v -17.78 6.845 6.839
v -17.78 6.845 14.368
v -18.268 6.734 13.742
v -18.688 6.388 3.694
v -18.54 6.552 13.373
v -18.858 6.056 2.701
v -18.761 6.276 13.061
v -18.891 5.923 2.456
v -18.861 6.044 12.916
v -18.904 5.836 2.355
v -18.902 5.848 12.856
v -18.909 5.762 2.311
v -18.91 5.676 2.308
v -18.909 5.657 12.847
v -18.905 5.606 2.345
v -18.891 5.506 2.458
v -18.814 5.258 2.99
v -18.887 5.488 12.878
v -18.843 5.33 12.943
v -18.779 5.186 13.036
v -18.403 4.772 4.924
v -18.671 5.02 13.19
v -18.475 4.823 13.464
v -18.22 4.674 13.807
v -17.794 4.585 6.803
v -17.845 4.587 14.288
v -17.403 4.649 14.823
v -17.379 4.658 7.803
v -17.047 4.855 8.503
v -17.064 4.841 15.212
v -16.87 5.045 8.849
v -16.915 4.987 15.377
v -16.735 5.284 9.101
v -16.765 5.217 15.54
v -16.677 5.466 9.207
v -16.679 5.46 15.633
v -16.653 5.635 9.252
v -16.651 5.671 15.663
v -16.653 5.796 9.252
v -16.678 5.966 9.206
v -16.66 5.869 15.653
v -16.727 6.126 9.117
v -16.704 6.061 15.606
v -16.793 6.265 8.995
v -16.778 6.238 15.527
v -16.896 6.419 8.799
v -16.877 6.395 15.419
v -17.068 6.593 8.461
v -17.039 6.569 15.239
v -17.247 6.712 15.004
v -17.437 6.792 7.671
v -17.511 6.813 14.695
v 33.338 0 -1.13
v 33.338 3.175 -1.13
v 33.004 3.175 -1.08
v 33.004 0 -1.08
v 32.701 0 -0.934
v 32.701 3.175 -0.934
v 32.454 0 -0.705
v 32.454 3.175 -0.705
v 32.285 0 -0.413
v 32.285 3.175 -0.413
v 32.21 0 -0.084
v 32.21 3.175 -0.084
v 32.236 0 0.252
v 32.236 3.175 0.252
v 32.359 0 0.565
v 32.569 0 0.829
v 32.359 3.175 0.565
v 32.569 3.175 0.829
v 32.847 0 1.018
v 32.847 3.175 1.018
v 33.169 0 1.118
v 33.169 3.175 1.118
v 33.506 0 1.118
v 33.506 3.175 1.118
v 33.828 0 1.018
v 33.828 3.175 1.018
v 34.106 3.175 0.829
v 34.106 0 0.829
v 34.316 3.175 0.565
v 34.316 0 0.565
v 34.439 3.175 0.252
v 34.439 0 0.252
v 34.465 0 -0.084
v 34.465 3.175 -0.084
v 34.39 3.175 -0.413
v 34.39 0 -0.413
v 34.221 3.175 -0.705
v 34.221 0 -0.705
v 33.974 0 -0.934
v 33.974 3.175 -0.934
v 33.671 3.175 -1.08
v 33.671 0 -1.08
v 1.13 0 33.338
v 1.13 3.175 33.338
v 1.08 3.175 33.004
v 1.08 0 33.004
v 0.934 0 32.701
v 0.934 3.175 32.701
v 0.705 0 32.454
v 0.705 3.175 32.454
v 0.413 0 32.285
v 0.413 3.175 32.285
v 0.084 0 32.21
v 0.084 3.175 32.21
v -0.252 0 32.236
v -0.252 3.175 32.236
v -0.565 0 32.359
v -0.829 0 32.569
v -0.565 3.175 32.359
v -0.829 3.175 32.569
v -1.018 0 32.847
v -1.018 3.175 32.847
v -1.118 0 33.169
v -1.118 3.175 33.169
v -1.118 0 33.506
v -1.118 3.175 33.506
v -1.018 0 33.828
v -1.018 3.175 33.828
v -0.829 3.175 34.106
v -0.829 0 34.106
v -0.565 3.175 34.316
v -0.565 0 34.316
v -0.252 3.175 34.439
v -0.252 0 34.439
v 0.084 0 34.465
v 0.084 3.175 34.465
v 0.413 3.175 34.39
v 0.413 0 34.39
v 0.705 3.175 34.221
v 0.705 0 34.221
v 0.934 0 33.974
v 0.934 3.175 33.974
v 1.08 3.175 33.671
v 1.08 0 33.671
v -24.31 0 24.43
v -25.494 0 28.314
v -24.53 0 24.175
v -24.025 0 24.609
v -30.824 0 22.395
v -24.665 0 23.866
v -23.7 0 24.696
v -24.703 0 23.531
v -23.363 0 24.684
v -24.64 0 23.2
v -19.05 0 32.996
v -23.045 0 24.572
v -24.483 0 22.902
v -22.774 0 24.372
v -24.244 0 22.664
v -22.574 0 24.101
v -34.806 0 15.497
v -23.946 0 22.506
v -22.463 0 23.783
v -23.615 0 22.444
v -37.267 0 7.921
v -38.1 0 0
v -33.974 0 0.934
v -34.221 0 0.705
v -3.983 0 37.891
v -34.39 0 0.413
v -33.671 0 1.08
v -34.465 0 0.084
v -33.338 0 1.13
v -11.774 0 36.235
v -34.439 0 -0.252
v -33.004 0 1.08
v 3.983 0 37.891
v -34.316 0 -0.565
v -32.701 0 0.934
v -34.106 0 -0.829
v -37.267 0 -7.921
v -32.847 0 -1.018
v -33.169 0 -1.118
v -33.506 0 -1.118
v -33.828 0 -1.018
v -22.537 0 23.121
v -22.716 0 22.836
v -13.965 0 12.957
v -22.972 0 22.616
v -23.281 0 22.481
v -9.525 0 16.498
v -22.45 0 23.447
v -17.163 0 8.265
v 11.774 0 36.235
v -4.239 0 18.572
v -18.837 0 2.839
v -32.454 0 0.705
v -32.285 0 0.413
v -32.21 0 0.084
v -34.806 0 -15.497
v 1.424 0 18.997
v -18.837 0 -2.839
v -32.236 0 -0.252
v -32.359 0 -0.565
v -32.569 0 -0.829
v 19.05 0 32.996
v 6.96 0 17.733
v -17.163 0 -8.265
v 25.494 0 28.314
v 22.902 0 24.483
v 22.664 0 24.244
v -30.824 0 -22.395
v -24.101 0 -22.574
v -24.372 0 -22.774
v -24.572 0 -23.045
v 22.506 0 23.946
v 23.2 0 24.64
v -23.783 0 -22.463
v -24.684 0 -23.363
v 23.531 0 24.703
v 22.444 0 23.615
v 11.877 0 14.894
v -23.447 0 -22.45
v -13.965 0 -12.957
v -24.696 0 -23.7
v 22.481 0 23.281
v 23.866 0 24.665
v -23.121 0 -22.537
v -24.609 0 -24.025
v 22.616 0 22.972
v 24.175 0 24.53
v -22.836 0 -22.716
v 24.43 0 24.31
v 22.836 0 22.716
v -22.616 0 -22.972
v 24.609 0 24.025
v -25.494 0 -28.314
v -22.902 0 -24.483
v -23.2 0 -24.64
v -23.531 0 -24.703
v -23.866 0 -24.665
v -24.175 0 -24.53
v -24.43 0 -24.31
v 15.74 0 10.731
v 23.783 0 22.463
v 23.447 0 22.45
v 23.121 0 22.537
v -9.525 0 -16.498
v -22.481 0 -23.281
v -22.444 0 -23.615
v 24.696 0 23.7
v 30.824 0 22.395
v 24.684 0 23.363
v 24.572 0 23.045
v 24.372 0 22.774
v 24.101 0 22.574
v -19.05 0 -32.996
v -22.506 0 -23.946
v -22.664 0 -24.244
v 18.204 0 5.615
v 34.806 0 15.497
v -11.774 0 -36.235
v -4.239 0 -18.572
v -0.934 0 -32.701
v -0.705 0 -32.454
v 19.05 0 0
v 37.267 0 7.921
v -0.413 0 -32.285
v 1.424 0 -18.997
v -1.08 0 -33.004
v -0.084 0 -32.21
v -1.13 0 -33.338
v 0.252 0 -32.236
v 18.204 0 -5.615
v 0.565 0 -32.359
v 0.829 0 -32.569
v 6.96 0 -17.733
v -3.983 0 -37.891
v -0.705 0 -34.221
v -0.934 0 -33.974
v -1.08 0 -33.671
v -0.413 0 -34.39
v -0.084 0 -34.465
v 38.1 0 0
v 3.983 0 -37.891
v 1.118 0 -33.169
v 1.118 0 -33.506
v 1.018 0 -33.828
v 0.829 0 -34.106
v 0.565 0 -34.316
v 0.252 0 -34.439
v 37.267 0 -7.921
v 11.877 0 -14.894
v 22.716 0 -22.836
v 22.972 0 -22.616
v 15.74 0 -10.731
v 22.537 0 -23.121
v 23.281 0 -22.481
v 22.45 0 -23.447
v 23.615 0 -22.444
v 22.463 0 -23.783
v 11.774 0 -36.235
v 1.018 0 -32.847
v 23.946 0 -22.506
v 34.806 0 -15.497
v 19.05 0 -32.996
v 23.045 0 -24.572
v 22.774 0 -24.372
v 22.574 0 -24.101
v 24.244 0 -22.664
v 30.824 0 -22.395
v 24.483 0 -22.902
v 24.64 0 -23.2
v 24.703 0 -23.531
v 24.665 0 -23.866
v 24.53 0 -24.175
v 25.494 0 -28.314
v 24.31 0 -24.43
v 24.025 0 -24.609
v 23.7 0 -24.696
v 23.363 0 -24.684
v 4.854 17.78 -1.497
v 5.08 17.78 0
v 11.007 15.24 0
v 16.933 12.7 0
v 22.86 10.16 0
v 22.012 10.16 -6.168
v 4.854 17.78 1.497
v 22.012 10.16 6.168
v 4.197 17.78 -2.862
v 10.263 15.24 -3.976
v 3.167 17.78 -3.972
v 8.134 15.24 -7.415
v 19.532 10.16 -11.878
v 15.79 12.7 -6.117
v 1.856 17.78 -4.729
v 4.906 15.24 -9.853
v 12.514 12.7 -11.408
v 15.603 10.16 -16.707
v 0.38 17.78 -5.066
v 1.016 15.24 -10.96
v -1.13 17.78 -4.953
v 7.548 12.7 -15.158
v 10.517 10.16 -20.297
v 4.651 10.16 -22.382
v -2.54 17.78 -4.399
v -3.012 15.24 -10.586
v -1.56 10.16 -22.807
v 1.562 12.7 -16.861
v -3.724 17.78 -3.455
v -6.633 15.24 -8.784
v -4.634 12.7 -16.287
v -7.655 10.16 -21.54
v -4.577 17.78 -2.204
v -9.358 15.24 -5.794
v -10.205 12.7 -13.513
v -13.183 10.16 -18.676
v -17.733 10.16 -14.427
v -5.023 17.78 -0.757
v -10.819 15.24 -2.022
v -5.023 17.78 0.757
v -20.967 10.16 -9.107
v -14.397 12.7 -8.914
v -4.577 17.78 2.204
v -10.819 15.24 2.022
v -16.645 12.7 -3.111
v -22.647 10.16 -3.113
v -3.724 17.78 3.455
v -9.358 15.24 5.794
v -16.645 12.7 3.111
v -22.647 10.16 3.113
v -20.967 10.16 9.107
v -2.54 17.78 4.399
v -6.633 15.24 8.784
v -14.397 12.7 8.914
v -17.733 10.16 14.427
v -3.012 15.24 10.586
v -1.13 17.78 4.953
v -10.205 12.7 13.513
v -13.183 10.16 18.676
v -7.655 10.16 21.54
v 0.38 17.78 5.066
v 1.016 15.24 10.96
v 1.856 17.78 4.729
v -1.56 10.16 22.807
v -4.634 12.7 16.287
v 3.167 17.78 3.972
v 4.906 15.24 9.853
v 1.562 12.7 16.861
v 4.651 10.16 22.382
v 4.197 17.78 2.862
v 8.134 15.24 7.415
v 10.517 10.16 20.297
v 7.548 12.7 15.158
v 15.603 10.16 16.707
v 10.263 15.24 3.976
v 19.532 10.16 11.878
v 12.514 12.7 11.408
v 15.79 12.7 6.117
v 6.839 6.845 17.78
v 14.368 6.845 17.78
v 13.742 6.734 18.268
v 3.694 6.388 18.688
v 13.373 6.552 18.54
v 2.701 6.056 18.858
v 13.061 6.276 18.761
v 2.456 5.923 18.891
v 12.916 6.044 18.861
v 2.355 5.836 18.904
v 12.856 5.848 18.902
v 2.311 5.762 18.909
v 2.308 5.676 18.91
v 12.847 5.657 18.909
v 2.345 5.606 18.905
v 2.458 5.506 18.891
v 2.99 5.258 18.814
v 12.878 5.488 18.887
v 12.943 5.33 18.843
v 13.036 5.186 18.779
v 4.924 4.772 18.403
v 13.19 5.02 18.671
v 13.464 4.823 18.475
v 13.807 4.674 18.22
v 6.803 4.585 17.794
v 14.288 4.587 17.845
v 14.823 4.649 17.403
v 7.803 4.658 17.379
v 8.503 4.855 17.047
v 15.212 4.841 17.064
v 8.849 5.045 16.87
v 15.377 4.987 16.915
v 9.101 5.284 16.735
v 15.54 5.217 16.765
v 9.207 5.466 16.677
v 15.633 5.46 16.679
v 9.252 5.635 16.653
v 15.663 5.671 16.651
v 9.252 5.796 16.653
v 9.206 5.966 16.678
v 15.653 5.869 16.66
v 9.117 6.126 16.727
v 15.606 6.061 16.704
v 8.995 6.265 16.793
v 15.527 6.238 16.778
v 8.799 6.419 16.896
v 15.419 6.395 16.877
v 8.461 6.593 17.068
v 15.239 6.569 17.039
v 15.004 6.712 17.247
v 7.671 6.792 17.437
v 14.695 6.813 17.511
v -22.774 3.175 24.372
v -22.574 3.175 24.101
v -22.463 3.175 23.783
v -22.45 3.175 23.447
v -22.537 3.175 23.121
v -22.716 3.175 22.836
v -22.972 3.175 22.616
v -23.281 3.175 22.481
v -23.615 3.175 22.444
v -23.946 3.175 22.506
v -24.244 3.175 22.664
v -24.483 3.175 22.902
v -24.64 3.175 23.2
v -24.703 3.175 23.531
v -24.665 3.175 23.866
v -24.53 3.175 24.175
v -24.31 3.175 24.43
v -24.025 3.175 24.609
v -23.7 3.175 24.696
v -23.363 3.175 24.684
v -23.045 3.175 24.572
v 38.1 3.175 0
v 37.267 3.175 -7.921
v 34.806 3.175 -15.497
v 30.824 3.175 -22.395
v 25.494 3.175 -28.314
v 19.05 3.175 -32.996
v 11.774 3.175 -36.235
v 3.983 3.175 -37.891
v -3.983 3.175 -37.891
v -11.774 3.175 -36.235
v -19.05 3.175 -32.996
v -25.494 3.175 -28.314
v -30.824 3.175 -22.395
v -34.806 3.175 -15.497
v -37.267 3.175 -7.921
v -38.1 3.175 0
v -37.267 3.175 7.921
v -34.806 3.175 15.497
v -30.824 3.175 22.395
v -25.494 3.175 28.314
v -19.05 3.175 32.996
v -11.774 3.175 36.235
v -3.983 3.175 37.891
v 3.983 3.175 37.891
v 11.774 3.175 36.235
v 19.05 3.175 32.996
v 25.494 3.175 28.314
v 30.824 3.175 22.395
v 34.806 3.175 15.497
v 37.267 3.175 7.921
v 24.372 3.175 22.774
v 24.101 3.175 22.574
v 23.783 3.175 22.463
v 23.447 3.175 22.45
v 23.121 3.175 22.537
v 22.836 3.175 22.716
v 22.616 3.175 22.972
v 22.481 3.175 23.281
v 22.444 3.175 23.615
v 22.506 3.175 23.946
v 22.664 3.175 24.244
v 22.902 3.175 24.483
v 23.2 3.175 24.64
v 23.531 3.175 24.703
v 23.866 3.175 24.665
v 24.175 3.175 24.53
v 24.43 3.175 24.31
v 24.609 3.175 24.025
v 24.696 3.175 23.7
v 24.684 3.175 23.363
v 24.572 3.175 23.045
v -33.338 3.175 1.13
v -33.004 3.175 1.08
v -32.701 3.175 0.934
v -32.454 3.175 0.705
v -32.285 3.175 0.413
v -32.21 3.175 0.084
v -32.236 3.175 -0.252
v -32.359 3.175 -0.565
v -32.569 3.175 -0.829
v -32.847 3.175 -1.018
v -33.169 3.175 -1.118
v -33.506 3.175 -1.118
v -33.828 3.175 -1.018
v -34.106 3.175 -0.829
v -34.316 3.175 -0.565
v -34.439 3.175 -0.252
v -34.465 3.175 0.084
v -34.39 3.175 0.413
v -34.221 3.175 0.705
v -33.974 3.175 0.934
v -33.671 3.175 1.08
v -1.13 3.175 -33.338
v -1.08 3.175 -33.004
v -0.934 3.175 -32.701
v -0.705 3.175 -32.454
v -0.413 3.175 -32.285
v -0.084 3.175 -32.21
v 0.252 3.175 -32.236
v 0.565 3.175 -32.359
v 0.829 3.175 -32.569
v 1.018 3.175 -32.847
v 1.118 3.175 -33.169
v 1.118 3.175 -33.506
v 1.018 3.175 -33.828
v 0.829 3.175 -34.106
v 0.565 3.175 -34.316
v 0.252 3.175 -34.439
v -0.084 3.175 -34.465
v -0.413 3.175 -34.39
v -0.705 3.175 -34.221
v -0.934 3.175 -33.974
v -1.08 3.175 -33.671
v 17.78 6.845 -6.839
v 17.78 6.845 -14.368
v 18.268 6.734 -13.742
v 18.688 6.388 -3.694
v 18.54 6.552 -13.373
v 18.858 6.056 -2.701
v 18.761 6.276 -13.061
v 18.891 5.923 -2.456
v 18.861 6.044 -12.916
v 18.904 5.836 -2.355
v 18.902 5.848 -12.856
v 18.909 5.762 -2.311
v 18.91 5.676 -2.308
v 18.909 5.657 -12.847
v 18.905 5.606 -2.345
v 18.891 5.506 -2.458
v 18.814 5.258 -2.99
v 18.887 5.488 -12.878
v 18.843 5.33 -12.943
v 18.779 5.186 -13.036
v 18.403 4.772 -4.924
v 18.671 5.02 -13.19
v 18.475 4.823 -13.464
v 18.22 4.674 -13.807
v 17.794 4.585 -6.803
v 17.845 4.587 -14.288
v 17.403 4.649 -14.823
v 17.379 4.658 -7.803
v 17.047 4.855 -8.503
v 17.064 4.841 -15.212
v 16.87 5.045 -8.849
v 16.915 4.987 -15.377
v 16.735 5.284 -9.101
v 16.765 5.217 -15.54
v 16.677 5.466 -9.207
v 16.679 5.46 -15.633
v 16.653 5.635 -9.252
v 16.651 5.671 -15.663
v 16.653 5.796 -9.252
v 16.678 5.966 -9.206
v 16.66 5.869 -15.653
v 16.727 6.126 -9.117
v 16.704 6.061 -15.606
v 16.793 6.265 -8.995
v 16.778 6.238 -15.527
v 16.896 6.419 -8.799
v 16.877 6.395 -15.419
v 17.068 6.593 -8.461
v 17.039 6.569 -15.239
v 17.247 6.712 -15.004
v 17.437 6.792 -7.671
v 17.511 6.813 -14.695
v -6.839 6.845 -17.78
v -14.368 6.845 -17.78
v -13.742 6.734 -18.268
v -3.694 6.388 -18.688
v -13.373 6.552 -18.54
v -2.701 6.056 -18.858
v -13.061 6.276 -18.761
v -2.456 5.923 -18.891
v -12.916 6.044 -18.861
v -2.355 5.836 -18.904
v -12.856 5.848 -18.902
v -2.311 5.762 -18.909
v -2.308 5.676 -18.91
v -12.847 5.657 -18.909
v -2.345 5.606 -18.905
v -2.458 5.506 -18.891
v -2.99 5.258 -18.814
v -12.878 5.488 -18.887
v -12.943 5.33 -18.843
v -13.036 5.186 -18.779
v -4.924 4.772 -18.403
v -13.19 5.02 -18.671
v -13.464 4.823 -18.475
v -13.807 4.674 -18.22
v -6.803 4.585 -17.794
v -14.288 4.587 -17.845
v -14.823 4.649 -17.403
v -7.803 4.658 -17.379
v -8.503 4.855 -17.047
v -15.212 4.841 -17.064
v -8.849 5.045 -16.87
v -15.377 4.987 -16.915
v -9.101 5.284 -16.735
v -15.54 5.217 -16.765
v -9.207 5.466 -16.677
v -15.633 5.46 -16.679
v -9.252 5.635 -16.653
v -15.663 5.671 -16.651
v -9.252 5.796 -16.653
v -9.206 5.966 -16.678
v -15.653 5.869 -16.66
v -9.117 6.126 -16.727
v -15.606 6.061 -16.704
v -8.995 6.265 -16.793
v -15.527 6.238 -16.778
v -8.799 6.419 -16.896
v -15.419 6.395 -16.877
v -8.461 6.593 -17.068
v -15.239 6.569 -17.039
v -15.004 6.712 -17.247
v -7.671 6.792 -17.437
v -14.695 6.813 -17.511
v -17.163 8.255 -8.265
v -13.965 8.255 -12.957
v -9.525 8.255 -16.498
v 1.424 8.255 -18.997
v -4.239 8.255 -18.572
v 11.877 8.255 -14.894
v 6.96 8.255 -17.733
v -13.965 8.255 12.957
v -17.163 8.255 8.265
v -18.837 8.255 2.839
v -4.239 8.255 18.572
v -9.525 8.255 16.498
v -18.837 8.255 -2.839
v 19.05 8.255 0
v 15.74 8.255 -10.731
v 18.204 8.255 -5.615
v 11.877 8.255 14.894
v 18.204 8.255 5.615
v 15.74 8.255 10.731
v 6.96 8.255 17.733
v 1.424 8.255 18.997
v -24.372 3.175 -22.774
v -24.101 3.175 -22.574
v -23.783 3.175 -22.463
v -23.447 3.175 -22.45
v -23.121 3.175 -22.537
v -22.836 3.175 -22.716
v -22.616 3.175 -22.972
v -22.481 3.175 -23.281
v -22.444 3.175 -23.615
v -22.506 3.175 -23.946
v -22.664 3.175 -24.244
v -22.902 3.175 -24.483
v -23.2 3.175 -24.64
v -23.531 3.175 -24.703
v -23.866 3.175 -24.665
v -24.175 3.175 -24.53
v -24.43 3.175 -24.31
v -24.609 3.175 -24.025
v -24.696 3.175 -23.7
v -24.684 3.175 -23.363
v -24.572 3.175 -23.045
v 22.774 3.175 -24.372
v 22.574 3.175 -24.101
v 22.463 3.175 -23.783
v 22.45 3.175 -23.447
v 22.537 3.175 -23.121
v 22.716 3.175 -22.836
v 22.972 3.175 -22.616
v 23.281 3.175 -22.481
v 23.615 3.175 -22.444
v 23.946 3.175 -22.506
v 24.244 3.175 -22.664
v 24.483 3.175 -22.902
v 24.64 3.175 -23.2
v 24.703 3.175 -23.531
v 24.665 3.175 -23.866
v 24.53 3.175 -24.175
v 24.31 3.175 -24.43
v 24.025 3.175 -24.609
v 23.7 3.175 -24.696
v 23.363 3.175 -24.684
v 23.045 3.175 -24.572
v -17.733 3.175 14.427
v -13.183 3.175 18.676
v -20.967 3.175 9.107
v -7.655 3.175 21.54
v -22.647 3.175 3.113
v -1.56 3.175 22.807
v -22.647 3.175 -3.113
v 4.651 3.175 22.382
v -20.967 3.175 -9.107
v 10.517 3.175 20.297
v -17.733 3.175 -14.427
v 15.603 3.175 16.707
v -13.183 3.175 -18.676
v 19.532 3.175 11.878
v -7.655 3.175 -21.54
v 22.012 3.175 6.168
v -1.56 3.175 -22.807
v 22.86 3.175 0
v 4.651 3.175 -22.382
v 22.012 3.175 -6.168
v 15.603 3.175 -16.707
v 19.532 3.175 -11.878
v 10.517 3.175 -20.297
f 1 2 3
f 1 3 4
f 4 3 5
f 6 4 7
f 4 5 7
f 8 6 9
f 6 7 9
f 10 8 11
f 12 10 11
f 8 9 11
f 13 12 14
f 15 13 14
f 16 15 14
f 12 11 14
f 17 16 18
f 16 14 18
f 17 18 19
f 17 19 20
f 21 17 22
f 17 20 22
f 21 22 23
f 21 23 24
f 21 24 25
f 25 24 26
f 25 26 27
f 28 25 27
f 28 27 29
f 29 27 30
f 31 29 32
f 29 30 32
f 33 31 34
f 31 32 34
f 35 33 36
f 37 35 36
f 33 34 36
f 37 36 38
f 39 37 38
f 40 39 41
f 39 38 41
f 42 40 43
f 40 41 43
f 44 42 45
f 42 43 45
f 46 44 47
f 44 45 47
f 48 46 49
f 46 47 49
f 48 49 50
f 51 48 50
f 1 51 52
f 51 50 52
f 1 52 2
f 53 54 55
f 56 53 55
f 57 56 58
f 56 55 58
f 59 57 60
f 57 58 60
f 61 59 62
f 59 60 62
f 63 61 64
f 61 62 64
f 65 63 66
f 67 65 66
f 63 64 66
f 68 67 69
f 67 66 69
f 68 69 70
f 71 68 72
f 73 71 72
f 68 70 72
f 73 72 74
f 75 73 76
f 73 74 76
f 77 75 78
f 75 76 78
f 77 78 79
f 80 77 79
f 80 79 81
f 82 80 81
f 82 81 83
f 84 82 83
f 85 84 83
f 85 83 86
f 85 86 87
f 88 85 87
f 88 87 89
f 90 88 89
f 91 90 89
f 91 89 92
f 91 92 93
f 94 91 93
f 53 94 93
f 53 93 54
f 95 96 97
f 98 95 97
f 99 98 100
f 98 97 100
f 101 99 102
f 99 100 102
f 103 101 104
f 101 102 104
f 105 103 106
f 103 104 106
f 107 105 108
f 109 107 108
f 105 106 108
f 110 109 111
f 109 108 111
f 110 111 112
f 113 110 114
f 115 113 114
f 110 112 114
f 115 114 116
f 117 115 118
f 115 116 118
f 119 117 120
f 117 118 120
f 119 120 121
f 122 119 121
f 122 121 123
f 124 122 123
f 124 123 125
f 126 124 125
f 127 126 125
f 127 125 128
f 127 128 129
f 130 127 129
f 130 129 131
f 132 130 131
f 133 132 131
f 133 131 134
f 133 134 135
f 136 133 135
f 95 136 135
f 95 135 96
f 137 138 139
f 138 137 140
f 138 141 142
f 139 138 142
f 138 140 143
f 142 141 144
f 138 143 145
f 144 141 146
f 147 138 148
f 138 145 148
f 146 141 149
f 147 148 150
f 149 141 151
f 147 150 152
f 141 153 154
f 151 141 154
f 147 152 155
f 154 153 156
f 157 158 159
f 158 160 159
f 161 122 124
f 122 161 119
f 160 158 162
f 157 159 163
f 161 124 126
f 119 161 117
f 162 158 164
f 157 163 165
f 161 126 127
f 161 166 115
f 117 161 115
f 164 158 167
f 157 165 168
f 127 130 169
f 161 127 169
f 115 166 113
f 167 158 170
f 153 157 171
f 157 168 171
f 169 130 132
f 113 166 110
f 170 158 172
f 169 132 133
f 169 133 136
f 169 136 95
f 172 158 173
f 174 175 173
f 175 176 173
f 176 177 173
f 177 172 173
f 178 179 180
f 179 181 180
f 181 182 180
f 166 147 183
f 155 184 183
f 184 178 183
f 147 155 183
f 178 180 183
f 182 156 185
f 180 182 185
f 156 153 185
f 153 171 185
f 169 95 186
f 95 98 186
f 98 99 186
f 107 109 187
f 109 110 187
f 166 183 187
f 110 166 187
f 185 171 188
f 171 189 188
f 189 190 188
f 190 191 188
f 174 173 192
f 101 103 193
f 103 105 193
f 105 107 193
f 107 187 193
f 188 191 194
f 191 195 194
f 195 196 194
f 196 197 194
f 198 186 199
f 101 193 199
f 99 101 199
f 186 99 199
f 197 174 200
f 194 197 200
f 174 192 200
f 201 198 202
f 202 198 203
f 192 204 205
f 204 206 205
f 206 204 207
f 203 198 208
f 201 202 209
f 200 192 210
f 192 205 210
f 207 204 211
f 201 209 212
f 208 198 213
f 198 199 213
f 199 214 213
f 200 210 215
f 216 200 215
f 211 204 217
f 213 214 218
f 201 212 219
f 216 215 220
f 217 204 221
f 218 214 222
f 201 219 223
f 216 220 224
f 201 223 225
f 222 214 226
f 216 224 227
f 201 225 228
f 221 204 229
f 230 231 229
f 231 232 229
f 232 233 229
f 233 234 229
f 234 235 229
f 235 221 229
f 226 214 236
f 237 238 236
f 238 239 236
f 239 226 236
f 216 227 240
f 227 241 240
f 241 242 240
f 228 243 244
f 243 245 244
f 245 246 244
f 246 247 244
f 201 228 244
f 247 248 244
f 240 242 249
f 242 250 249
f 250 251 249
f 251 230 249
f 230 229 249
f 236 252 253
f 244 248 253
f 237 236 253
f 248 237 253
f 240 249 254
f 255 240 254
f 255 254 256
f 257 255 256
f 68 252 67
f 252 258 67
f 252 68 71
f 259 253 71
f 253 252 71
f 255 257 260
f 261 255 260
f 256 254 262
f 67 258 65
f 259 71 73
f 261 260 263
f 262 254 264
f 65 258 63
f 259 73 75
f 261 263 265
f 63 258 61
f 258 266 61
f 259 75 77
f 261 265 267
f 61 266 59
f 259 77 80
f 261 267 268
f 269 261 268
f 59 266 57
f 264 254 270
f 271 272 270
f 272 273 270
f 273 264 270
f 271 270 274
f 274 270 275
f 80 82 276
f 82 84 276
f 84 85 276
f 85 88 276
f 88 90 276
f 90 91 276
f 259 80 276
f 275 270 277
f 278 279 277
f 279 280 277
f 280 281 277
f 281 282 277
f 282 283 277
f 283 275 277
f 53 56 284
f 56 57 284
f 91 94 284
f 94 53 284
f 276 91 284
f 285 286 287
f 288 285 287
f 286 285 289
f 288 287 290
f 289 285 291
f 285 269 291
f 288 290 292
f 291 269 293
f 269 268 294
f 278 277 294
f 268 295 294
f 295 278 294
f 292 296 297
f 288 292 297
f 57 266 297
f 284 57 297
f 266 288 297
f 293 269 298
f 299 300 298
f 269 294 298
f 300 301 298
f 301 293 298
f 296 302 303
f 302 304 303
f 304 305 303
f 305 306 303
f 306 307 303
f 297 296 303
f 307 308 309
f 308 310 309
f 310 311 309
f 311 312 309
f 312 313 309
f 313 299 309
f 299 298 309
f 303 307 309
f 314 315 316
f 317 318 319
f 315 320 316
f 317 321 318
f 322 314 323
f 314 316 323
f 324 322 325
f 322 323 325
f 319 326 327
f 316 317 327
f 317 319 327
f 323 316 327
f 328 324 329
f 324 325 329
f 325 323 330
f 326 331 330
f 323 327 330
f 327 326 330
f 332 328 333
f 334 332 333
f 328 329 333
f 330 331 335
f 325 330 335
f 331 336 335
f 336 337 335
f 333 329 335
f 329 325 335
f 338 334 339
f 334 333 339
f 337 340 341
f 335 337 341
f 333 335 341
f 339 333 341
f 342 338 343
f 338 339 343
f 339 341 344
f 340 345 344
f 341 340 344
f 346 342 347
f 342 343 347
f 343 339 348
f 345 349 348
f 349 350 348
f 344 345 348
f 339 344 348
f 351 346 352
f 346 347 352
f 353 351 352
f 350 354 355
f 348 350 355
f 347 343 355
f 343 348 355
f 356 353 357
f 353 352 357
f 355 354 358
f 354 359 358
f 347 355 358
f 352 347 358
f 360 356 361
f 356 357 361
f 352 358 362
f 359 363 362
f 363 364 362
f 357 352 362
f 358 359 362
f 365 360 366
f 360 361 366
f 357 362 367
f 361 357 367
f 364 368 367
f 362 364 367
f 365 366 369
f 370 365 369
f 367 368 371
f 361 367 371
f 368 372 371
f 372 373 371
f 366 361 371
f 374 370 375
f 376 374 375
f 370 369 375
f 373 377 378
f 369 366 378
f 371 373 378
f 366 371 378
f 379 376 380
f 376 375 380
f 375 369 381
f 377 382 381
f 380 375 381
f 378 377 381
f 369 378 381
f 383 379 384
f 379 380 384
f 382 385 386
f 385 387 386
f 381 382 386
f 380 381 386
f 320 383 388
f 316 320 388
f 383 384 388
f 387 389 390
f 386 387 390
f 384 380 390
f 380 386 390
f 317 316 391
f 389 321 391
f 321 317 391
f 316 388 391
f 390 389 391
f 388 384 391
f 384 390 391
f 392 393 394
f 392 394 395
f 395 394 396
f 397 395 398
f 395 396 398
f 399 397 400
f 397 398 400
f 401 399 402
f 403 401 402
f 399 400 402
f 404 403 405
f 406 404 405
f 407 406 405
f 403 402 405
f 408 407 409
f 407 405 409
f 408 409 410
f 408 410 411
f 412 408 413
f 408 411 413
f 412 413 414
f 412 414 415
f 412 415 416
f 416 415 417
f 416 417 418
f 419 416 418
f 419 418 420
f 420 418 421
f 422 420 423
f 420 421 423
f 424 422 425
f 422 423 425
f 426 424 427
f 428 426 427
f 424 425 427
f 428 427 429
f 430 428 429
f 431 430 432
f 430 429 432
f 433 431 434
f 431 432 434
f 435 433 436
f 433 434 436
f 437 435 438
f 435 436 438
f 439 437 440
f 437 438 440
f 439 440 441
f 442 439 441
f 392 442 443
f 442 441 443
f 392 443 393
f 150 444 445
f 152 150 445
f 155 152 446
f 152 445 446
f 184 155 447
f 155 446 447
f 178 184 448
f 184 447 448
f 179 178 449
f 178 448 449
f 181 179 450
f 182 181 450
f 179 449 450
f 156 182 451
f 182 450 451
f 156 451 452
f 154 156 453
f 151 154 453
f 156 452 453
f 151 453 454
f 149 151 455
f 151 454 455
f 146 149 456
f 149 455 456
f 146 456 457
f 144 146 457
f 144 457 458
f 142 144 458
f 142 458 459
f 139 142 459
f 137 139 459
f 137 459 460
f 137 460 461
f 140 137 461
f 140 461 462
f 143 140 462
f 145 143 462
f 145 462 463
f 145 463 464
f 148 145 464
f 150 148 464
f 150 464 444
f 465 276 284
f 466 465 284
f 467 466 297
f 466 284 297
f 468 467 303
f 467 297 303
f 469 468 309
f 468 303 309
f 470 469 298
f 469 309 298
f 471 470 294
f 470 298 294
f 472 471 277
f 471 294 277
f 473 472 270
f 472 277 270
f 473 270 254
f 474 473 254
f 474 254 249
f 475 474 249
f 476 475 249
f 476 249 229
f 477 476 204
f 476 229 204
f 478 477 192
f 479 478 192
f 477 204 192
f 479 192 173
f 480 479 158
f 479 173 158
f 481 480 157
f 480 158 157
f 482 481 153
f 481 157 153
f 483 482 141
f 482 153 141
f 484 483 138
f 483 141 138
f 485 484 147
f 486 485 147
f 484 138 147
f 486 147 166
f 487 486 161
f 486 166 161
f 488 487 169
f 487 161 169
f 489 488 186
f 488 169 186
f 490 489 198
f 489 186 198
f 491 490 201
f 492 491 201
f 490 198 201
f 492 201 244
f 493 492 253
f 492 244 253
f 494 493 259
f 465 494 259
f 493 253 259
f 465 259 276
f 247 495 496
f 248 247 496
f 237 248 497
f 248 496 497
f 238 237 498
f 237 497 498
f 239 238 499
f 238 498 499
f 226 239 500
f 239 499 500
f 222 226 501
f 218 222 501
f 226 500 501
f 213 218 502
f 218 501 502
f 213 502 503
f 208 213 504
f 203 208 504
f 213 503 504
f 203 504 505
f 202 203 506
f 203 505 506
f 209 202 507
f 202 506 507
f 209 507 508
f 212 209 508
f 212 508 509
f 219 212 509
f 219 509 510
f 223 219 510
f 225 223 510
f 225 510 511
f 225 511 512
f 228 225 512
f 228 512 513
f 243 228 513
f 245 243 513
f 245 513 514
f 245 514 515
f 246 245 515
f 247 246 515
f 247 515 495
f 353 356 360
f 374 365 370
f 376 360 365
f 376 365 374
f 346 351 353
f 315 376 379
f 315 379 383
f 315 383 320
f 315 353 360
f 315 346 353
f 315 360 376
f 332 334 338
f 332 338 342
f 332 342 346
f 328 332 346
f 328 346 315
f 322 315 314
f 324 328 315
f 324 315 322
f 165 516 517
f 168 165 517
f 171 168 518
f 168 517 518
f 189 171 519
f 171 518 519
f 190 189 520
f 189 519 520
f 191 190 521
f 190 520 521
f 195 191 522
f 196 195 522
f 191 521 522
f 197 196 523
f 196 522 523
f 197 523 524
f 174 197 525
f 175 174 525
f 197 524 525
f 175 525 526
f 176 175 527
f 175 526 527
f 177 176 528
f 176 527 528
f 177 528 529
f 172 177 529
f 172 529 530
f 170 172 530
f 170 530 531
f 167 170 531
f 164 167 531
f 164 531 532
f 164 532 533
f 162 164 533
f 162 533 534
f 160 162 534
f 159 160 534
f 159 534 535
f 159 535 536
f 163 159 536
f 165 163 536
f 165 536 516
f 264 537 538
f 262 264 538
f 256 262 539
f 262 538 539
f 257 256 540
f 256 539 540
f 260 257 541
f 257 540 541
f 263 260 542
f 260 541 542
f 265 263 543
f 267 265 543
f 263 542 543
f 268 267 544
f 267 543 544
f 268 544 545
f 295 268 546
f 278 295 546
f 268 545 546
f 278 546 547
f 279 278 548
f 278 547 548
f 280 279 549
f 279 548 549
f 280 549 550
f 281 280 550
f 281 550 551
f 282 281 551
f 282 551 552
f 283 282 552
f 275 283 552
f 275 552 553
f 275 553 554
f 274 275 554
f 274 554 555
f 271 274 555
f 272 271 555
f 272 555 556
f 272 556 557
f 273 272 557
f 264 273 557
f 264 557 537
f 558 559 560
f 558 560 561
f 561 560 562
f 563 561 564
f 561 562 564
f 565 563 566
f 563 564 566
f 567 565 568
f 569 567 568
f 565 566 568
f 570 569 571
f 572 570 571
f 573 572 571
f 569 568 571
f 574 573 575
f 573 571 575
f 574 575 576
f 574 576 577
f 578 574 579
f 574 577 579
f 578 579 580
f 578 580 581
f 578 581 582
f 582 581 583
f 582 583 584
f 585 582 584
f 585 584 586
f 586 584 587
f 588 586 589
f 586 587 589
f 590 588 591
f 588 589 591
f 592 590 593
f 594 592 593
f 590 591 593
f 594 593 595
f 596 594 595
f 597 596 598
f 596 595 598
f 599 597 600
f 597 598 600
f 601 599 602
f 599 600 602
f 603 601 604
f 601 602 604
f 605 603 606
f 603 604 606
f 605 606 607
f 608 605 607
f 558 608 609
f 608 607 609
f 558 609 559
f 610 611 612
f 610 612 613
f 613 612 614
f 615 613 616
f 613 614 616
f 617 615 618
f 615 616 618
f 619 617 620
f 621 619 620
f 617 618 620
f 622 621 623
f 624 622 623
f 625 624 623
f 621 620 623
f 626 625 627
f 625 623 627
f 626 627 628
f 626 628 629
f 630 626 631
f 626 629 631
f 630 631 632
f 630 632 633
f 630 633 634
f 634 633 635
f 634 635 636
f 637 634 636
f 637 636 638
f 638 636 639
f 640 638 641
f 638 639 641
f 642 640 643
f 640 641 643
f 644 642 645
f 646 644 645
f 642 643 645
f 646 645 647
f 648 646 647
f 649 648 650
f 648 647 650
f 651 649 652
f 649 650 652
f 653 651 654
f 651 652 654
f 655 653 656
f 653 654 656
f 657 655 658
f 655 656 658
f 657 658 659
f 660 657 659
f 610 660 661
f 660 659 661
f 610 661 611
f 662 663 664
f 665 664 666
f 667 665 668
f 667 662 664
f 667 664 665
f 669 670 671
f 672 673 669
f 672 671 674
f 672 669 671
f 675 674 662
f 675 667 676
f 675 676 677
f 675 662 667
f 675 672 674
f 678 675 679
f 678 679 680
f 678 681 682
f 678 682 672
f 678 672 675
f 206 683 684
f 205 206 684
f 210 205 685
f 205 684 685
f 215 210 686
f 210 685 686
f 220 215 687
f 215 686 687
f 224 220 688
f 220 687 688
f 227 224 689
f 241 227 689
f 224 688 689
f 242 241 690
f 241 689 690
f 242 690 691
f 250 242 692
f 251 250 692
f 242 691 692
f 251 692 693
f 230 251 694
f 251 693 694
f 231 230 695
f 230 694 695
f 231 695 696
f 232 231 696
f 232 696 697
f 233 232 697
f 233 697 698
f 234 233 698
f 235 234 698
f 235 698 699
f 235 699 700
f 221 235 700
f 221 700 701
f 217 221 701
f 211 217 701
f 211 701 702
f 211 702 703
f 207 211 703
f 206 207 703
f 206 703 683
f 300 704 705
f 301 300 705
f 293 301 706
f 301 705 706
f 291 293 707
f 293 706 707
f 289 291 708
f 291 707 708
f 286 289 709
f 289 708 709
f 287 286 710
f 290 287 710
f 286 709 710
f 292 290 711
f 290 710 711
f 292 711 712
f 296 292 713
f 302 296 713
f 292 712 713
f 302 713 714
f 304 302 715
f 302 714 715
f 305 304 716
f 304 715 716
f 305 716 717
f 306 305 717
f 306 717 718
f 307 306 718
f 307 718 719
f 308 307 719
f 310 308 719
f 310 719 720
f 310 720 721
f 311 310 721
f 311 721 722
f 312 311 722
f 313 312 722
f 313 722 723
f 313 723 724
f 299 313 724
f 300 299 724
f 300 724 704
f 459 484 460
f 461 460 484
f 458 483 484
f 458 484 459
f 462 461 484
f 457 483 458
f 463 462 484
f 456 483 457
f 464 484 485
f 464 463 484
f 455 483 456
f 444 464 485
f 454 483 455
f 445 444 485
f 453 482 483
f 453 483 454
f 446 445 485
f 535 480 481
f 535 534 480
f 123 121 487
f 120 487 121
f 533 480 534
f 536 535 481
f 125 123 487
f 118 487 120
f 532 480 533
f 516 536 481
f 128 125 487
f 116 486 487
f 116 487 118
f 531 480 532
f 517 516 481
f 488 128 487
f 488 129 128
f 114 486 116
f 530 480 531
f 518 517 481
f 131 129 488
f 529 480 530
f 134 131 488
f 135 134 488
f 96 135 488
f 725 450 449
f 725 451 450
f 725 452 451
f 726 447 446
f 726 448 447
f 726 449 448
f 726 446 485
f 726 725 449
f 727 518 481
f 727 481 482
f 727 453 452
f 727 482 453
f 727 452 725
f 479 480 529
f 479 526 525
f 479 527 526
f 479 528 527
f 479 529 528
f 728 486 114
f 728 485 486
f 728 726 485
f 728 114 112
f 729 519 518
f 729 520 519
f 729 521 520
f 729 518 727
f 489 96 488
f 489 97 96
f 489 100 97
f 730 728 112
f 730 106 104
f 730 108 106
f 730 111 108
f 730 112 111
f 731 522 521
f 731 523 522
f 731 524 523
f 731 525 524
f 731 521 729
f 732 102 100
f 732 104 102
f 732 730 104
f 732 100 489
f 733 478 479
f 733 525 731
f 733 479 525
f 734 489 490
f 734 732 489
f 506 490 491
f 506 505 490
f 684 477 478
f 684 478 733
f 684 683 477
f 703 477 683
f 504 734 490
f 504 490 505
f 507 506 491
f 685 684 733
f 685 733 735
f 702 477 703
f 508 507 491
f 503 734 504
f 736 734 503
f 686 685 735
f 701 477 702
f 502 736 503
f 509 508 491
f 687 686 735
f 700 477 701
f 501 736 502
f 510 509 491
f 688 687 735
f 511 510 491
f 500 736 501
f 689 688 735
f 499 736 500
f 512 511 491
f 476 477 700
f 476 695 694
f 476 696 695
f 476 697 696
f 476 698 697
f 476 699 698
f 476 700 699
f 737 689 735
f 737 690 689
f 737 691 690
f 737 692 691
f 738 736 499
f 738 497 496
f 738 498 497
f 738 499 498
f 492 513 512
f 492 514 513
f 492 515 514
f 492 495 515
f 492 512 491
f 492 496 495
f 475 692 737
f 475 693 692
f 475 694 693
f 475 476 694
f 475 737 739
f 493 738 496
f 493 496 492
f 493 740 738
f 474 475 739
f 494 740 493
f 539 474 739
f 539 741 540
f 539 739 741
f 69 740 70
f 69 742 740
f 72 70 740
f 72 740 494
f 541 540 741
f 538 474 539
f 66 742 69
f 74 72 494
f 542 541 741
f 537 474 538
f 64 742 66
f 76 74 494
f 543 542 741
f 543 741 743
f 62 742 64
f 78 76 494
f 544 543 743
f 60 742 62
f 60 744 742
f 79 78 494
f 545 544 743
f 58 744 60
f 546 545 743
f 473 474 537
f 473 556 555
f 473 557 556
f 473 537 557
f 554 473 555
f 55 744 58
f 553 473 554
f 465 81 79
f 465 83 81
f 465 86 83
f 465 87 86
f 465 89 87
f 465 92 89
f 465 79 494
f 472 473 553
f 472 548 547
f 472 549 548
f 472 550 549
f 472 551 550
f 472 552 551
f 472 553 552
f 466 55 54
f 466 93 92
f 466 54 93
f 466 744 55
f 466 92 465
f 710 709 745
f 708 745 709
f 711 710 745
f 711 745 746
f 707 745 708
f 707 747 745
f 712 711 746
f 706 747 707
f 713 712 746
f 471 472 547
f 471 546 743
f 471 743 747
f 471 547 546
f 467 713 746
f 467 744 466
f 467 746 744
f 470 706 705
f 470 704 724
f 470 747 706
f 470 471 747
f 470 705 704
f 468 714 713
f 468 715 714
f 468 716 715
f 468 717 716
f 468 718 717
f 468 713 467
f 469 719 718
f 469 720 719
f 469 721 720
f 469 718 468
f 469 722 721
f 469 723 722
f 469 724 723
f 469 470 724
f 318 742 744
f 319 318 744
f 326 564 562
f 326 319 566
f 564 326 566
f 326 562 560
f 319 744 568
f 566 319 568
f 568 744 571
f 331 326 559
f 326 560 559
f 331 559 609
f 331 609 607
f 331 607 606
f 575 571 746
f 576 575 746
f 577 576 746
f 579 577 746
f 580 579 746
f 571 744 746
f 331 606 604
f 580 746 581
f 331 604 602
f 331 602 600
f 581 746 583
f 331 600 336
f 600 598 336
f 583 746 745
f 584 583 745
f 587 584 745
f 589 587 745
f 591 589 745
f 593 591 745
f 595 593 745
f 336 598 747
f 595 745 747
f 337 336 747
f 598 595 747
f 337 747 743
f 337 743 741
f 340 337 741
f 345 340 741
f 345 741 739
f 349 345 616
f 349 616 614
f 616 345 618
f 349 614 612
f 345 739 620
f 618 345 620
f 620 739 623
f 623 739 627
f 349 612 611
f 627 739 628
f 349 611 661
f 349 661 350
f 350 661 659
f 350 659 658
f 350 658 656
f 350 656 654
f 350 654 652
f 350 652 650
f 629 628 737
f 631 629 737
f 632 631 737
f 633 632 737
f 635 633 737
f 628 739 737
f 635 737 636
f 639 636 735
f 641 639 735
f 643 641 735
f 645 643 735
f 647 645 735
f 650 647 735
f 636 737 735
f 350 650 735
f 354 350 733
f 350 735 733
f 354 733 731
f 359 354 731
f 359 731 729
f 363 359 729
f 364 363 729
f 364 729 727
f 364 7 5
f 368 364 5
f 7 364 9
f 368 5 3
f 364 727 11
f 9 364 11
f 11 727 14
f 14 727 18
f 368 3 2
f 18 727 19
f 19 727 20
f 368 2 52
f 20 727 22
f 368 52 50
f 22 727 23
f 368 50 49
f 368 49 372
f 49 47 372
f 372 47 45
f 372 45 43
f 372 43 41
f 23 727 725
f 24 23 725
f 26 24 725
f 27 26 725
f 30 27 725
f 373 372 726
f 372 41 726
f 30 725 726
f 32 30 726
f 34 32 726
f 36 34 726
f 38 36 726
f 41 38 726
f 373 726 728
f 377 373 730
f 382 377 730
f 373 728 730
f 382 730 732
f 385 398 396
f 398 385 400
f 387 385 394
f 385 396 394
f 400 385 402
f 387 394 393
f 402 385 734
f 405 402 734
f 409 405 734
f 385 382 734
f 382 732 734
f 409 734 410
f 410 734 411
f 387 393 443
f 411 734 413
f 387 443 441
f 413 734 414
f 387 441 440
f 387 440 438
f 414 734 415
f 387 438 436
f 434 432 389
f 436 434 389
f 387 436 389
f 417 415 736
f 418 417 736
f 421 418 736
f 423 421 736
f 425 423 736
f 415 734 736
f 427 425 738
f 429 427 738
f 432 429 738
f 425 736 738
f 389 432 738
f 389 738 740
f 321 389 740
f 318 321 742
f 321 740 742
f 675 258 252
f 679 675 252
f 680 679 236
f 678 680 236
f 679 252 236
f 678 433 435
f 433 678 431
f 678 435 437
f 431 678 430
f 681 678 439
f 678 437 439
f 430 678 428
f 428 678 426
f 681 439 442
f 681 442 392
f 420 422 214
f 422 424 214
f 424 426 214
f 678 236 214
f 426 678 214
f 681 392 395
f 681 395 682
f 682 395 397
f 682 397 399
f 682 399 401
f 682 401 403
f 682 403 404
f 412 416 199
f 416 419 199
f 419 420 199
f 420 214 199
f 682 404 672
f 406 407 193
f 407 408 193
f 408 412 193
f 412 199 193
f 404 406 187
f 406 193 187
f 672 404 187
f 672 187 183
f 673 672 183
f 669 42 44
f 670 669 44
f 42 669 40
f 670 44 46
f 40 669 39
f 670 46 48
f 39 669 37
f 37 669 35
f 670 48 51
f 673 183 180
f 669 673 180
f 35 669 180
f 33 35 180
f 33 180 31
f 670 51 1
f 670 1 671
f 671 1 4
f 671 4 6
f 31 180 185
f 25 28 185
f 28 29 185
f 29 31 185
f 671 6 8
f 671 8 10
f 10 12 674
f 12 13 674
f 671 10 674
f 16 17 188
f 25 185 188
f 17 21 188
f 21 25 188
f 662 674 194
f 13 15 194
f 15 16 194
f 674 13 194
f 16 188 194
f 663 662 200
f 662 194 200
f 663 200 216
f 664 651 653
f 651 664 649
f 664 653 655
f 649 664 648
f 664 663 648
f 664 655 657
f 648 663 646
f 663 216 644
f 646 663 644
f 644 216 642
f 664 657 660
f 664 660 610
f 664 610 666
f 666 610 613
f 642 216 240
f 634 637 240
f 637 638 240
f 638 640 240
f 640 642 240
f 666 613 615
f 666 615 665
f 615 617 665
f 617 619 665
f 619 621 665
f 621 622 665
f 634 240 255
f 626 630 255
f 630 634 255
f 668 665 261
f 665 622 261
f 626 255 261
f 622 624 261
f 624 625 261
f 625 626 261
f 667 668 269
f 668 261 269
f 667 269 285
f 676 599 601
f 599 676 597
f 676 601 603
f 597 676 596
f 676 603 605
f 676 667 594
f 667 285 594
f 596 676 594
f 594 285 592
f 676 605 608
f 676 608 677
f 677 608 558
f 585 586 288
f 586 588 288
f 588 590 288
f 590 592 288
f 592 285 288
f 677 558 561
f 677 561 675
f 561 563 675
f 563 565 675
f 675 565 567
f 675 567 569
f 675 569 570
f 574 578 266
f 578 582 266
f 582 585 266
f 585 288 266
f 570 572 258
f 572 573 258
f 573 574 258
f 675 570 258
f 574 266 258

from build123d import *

# Parameters (mm, degrees)
SKETCH2_R                 = 38.1
BOSS_EXTRUDE1_DEPTH       = 3.175
TAP_DRILL_FOR_4_40_TAP1_D = 2.2606
CIRPATTERN1_COUNT         = 8
SKETCH7_R                 = 22.86
BOSS_EXTRUDE2_DEPTH       = 6.985
SKETCH8_R                 = 19.05
CUT_EXTRUDE1_DEPTH        = 8.255
SKETCH12_W                = 1.1303
SKETCH12_H                = 38.1
CIRPATTERN2_COUNT         = 4
SKETCH14_R                = 5.08
SKETCH13_R                = 22.86


with BuildPart() as part:
    # Sketch2 → Boss-Extrude1 (new body)
    with BuildSketch(Plane(origin=(0, 0, 0), x_dir=(1, 0, 0), z_dir=(0, 1, 0))):
        Circle(SKETCH2_R)
    extrude(amount=BOSS_EXTRUDE1_DEPTH)

    # Tap Drill for #4-40 Tap1 (through all)
    with Locations(Plane(origin=(0, 0, 0), x_dir=(-1, 0, 0), z_dir=(0, -1, 0))):
        with Locations((0, -33.3375)):
            tap_drill_for_4_40_tap1 = Hole(TAP_DRILL_FOR_4_40_TAP1_D / 2)

    # CirPattern1: Tap Drill for #4-40 Tap1 ×8 about axis
    cirpattern1_axis = Axis((0, 0, 0), (0, 1, 0))
    for i in range(1, CIRPATTERN1_COUNT):
        add(tap_drill_for_4_40_tap1.rotate(cirpattern1_axis, i * 360 / CIRPATTERN1_COUNT), mode=Mode.SUBTRACT)

    # Sketch7 → Boss-Extrude2 (add)
    with BuildSketch(Plane(origin=(0, 3.175, 0), x_dir=(1, 0, 0), z_dir=(0, 1, 0))):
        Circle(SKETCH7_R)
    extrude(amount=BOSS_EXTRUDE2_DEPTH)

    # Sketch8 → Cut-Extrude1 (cut)
    with BuildSketch(Plane.XZ):
        Circle(SKETCH8_R)
    extrude(amount=-CUT_EXTRUDE1_DEPTH, mode=Mode.SUBTRACT)

    # Sketch12 → Tap Drill for #4-40 Tap2 (revolve, cut)
    with BuildSketch(Plane(origin=(-17.78, 5.715, 0), x_dir=(0, 1, 0), z_dir=(1, 0, 0))):
        with Locations((0.56515, 19.05)):
            Rectangle(SKETCH12_W, SKETCH12_H)
    tap_drill_for_4_40_tap2 = revolve(axis=Axis((-17.78, 5.715, -6.35), (0, 0, 1)), mode=Mode.SUBTRACT)

    # CirPattern2: Tap Drill for #4-40 Tap2 ×4 about axis
    cirpattern2_axis = Axis((0, 10.16, 0), (0, 1, 0))
    for i in range(1, CIRPATTERN2_COUNT):
        add(tap_drill_for_4_40_tap2.rotate(cirpattern2_axis, i * 360 / CIRPATTERN2_COUNT), mode=Mode.SUBTRACT)

    # Sketch14 → Loft2 section 0
    with BuildSketch(Plane(origin=(0, 17.78, 0), x_dir=(1, 0, 0), z_dir=(0, 1, 0))):
        Circle(SKETCH14_R)
    # Sketch13 → Loft2 section 1
    with BuildSketch(Plane(origin=(0, 10.16, 0), x_dir=(1, 0, 0), z_dir=(0, 1, 0))):
        Circle(SKETCH13_R)
    loft()


solid = part.part
